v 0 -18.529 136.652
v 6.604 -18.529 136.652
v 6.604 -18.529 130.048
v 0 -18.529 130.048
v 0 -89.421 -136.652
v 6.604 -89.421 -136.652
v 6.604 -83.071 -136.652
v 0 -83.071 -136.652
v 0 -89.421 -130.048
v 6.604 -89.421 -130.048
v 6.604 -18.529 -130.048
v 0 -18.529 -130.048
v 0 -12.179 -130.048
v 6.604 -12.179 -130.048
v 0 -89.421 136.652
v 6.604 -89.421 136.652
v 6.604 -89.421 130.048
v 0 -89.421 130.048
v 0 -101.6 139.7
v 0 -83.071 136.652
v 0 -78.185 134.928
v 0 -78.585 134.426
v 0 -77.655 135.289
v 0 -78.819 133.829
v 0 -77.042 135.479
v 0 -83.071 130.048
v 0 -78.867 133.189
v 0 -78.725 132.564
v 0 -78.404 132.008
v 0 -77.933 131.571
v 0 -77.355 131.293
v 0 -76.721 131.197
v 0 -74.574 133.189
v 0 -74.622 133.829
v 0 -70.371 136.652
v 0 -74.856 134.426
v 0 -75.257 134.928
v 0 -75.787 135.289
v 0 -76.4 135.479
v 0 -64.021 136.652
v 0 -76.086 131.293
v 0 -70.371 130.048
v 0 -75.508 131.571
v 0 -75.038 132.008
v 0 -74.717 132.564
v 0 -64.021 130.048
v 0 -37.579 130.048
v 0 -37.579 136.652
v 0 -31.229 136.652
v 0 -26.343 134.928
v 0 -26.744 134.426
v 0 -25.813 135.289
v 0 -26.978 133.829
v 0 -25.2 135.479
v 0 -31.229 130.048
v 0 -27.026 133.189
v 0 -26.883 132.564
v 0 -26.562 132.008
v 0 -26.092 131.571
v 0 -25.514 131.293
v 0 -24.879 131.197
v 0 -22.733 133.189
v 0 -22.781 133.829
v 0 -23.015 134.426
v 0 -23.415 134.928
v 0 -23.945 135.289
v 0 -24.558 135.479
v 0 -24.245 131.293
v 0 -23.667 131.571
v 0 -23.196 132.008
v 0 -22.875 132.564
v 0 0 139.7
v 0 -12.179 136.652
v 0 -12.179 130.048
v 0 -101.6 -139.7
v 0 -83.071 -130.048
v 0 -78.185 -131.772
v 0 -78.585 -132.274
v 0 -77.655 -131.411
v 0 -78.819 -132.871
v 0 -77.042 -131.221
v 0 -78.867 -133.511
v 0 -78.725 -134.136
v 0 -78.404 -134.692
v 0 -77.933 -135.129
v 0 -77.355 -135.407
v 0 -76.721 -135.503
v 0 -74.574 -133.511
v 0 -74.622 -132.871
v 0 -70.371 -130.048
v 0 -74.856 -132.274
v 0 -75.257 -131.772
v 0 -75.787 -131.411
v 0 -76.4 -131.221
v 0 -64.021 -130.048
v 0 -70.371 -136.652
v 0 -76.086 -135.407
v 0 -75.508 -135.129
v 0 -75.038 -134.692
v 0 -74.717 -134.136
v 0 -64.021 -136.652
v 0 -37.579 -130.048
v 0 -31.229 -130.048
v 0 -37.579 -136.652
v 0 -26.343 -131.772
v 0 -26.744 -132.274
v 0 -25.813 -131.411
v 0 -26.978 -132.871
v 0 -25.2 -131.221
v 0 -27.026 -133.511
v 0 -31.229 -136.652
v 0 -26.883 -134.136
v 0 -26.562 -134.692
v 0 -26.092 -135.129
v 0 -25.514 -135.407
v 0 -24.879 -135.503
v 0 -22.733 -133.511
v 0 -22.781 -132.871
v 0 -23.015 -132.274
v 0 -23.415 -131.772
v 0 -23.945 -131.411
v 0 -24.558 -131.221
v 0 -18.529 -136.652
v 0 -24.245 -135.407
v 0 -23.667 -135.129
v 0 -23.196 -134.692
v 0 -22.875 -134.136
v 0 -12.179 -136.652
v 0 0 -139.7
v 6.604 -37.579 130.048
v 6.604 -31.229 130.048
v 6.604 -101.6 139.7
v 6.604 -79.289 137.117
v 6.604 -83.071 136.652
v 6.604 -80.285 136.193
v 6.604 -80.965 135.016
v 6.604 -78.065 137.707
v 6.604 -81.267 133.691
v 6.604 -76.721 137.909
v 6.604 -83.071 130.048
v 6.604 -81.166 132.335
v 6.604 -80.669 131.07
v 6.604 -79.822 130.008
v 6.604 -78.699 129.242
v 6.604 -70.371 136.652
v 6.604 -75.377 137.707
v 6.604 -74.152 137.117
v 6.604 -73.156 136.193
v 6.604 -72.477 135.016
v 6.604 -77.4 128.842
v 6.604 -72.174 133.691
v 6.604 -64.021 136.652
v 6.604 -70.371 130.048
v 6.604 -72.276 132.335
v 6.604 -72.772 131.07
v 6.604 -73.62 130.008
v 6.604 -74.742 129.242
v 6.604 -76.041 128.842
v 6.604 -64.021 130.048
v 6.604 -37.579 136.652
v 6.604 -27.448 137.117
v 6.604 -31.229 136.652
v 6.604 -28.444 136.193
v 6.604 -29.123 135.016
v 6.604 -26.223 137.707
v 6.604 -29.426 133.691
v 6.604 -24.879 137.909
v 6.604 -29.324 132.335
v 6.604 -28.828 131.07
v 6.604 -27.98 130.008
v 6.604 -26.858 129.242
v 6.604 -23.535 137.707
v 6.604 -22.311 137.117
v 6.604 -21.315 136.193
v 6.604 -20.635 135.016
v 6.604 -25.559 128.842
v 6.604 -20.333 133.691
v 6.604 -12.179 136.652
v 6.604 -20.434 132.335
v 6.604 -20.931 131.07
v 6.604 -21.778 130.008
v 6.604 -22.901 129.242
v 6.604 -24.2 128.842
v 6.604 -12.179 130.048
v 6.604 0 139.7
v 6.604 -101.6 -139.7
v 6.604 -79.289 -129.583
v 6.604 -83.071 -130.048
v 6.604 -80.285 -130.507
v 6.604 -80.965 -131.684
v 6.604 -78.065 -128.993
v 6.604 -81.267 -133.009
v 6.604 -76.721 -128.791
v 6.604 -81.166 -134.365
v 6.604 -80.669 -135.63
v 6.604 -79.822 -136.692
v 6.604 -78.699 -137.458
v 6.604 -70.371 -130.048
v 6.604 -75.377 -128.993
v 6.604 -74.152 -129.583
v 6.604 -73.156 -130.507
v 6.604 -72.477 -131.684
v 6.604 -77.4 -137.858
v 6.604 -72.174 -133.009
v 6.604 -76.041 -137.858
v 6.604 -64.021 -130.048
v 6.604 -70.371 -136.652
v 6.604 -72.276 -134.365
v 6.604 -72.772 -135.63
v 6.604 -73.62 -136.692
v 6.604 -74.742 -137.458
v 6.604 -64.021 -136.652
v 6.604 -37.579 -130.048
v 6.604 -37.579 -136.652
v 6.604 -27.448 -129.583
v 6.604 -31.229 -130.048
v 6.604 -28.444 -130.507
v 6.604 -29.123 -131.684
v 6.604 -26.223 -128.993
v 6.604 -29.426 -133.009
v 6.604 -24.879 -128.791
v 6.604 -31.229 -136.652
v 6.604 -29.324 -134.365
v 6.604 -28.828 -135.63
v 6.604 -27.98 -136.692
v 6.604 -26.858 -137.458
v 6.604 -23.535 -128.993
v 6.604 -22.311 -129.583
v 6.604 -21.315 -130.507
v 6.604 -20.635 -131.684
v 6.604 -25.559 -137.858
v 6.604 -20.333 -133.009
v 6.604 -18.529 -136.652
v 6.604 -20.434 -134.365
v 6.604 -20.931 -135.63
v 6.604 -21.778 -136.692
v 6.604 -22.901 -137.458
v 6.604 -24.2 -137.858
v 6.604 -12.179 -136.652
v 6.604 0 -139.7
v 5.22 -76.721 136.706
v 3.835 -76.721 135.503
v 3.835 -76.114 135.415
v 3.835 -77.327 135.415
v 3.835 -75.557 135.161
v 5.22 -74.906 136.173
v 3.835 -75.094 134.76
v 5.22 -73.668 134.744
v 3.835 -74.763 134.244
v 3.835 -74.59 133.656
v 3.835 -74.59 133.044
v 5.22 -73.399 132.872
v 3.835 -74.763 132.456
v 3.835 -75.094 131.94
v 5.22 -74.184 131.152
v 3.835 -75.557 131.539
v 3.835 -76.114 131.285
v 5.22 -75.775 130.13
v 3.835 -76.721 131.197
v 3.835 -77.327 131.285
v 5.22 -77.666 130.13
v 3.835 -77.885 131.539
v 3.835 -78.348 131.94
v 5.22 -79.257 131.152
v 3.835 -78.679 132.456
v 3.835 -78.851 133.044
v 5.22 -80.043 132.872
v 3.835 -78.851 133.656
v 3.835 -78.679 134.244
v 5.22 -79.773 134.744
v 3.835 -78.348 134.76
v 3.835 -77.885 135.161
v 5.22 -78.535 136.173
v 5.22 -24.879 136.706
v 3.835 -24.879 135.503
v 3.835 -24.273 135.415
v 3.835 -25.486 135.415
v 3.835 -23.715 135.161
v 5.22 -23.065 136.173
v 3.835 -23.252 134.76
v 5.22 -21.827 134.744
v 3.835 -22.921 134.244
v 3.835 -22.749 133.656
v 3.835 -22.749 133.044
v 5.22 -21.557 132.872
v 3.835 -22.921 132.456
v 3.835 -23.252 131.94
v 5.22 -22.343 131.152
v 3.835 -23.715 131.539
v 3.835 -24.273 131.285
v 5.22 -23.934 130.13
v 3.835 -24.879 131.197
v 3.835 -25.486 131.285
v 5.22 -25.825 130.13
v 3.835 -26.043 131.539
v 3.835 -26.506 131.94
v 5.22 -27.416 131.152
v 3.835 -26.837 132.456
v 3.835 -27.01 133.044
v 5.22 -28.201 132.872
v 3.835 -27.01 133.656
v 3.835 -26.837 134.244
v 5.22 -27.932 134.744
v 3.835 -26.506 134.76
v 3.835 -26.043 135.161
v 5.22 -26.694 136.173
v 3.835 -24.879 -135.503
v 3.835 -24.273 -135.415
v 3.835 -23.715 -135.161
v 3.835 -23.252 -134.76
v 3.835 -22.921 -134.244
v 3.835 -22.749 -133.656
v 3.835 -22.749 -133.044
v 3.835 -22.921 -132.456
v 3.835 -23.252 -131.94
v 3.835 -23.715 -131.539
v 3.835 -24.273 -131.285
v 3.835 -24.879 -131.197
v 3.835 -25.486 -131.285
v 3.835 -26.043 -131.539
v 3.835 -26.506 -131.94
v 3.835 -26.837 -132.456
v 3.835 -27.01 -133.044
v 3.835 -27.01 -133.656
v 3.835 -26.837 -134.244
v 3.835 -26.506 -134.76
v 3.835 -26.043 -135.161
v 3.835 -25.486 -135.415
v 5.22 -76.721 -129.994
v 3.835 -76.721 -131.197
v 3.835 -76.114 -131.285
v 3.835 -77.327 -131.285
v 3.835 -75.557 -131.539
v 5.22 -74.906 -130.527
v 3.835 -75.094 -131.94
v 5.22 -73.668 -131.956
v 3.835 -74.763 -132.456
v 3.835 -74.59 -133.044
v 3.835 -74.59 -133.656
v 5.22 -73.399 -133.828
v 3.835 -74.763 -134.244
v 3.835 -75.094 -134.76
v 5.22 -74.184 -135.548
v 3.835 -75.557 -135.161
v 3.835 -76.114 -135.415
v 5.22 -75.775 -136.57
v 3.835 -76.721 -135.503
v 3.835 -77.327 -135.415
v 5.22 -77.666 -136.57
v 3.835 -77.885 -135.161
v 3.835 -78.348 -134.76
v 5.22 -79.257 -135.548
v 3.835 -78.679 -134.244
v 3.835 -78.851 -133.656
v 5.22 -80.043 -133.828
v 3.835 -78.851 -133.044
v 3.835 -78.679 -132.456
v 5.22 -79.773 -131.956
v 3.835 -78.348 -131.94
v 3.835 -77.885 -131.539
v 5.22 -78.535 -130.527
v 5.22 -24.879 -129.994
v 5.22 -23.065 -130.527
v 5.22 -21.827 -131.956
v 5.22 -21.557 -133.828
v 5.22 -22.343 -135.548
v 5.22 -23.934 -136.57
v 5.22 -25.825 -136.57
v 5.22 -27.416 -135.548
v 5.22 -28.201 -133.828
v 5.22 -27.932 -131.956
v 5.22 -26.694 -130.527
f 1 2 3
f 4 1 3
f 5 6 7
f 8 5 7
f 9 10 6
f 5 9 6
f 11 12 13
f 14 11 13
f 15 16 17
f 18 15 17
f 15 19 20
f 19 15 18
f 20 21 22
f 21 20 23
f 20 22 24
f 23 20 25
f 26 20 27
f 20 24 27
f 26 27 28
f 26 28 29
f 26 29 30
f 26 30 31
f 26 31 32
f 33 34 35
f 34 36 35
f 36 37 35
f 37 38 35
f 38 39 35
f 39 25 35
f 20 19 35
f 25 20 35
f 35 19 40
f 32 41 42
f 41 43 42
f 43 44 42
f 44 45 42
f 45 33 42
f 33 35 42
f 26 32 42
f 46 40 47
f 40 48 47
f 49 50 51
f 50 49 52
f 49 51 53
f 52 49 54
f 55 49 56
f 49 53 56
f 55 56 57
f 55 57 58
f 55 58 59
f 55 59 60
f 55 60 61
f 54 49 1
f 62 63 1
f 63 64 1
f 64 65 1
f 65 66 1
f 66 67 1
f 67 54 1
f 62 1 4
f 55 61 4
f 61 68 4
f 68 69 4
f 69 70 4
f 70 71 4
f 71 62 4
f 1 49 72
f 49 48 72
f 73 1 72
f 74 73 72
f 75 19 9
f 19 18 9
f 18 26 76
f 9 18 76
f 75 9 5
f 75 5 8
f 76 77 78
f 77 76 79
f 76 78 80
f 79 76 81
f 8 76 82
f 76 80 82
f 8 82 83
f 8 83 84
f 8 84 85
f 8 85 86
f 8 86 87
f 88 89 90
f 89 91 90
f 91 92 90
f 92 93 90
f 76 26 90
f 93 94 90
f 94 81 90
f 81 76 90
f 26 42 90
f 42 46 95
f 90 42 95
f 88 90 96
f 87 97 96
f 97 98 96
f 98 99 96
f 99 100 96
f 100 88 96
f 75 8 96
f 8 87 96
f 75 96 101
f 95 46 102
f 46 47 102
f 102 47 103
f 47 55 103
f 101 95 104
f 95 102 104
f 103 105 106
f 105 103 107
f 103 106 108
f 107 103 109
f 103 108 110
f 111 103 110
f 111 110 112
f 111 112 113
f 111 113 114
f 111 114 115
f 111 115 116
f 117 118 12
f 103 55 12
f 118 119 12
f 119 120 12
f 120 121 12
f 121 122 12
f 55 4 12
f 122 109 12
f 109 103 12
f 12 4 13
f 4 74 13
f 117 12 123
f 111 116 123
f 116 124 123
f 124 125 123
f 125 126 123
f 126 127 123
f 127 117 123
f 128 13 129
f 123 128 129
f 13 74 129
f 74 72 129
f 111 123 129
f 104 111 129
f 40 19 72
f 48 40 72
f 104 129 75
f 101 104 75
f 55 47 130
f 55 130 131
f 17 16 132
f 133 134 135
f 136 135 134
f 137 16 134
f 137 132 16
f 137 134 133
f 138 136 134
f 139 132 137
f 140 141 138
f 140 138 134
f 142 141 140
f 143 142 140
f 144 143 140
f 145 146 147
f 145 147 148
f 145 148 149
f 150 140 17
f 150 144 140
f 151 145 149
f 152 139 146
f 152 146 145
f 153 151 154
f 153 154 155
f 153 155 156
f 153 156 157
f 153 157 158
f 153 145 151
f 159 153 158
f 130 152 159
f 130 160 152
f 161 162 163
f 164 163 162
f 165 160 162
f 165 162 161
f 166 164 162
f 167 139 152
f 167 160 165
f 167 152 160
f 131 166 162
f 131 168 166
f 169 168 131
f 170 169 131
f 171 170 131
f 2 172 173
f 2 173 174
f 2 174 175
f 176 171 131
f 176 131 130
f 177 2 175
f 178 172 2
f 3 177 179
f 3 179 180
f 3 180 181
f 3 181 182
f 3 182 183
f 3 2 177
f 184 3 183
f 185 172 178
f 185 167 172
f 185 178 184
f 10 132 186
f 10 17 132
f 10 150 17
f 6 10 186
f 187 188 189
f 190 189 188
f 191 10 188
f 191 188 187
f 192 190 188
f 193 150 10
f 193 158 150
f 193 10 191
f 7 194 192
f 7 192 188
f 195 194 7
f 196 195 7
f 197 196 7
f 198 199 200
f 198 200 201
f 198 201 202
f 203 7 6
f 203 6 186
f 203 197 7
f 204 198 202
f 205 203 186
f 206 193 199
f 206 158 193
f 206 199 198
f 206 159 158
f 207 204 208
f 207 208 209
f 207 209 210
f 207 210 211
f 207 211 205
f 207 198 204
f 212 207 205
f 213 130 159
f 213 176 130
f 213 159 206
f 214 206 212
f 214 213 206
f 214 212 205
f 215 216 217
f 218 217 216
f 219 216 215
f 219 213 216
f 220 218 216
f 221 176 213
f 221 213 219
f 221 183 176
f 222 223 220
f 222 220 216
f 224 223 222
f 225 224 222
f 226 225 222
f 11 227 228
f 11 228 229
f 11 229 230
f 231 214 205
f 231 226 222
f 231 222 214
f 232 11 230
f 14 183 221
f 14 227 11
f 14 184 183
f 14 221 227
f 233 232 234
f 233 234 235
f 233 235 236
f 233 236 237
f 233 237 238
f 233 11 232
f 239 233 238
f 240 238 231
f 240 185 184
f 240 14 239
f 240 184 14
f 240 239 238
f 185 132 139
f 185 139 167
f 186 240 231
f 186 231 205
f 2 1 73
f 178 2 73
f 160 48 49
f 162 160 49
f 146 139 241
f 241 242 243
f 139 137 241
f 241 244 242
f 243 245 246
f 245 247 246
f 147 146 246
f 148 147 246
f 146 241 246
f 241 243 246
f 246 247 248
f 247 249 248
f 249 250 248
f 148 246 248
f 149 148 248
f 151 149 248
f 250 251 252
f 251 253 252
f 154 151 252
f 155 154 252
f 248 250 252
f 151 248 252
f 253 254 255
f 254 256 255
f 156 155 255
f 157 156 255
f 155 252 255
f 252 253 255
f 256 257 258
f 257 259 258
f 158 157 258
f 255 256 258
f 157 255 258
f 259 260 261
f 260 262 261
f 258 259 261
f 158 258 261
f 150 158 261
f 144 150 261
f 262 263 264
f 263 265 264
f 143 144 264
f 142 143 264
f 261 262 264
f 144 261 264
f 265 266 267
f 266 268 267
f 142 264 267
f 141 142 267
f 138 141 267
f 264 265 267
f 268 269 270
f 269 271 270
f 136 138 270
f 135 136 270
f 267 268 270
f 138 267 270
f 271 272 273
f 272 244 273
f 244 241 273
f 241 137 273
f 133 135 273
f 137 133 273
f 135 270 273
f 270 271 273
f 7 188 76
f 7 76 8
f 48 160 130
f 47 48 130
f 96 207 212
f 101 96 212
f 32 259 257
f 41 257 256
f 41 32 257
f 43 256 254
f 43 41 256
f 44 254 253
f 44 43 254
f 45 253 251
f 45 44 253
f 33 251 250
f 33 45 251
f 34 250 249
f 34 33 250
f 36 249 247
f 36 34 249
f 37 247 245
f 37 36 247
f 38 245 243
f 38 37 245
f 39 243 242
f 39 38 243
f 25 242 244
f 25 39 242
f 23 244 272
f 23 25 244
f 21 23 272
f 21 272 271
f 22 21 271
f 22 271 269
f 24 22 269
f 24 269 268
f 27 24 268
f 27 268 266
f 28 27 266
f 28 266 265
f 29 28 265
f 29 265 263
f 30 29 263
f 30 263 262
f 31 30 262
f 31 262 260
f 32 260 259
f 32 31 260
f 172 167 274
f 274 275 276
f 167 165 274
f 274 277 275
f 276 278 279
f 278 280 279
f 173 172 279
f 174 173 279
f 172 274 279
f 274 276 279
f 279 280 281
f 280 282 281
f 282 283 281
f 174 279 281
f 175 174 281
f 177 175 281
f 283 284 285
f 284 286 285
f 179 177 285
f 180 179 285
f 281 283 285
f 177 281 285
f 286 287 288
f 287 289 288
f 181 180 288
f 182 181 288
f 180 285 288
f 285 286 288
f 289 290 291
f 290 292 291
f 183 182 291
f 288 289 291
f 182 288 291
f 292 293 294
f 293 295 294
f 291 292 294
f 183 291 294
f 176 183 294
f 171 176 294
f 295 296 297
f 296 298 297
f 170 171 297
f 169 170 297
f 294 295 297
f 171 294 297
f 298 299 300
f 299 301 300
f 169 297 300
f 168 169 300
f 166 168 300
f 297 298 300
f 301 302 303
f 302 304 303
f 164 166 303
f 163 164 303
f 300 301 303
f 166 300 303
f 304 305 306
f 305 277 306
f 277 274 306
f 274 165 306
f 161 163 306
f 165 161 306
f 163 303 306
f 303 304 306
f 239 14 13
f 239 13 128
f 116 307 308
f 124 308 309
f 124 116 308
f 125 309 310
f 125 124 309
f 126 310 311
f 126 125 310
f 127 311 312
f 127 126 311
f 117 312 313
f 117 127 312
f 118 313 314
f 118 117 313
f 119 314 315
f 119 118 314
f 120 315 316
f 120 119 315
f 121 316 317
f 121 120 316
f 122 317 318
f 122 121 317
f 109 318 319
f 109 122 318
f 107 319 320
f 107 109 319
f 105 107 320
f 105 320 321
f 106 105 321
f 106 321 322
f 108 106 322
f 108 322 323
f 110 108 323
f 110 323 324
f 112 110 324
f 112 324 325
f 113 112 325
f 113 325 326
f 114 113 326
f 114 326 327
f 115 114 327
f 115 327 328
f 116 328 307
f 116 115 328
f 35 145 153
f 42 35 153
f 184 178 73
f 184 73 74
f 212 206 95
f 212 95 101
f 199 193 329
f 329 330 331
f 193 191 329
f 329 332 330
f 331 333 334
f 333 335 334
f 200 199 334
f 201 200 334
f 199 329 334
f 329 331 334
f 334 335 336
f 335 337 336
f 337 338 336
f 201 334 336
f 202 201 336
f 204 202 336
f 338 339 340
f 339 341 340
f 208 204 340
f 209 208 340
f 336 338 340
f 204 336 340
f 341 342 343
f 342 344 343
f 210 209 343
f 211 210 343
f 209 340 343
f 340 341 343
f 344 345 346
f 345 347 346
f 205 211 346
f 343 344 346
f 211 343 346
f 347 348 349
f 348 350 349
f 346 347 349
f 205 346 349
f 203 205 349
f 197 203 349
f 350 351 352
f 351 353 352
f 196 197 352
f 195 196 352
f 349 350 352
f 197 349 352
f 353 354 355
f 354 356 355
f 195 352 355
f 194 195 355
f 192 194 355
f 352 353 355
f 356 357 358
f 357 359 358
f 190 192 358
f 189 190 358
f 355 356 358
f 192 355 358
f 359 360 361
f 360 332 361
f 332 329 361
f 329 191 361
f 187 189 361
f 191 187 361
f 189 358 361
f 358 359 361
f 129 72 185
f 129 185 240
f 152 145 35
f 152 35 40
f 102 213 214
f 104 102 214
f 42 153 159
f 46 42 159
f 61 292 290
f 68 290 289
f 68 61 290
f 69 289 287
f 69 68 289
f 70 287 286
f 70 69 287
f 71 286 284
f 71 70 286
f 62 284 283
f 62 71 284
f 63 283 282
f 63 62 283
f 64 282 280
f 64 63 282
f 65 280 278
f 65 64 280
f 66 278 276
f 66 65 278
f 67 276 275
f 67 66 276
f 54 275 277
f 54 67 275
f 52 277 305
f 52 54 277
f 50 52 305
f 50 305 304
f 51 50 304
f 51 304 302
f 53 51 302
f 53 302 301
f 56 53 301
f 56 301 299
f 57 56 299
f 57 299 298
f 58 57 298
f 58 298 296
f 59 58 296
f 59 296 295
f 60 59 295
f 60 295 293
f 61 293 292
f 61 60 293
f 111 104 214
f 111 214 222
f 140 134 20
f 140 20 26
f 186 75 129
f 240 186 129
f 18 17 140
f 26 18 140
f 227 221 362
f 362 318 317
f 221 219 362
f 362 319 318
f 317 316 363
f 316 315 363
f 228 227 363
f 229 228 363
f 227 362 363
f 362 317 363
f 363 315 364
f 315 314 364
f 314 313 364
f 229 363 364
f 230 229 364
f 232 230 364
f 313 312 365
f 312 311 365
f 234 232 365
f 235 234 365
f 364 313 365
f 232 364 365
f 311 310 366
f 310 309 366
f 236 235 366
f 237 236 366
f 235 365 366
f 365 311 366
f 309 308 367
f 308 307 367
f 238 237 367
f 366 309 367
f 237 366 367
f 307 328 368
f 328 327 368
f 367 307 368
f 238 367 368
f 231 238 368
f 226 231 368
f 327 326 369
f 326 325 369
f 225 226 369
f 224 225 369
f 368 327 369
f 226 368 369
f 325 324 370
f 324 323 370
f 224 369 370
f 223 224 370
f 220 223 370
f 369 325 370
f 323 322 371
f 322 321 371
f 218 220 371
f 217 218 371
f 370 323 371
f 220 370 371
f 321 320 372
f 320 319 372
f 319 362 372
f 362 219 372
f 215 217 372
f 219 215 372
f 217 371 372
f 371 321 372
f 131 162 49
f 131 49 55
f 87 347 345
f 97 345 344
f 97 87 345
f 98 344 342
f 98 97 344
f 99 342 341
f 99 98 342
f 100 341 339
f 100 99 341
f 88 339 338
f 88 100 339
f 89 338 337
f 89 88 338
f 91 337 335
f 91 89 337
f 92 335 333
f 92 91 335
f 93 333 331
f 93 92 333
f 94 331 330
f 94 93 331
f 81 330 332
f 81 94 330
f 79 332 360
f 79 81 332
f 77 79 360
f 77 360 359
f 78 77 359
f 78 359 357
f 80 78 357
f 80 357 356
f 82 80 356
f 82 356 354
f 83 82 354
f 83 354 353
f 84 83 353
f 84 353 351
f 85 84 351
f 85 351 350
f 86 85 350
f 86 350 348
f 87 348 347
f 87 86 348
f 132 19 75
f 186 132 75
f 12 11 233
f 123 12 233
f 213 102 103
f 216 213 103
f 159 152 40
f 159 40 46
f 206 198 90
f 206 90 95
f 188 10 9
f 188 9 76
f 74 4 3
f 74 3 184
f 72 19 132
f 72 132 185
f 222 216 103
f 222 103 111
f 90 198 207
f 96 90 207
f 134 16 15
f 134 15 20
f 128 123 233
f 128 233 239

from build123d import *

# Parameters (mm, degrees)
SKETCH1_W                                         = 279.4
SKETCH1_H                                         = 101.6
SKETCH1_R                                         = 2.15265
SKETCH1_W_2                                       = 6.604
SKETCH1_H_2                                       = 6.35
BOSS_EXTRUDE1_DEPTH                               = 6.604
CSK_FOR_8_FLAT_HEAD_SOCKET_CAP_SCREW1_D           = 4.3053
CSK_FOR_8_FLAT_HEAD_SOCKET_CAP_SCREW1_CSINK_D     = 9.1186
CSK_FOR_8_FLAT_HEAD_SOCKET_CAP_SCREW1_CSINK_ANGLE = 82


with BuildPart() as part:
    # Sketch1 → Boss-Extrude1 (new body)
    with BuildSketch(Plane(origin=(0, 0, 0), x_dir=(0, 0, -1), z_dir=(1, 0, 0))):
        with Locations((0, -50.8)):
            Rectangle(SKETCH1_W, SKETCH1_H)
        with Locations((-133.35, -24.8793)):
            Circle(SKETCH1_R, mode=Mode.SUBTRACT)
        with Locations((-133.35, -76.7207)):
            Circle(SKETCH1_R, mode=Mode.SUBTRACT)
        with Locations((133.35, -24.8793)):
            Circle(SKETCH1_R, mode=Mode.SUBTRACT)
        with Locations((133.35, -76.720700102)):
            Circle(SKETCH1_R, mode=Mode.SUBTRACT)
        with Locations((-133.35, -34.4043)):
            Rectangle(SKETCH1_W_2, SKETCH1_H_2, mode=Mode.SUBTRACT)
        with Locations((-133.35, -15.3543)):
            Rectangle(SKETCH1_W_2, SKETCH1_H_2, mode=Mode.SUBTRACT)
        with Locations((-133.35, -86.2457)):
            Rectangle(SKETCH1_W_2, SKETCH1_H_2, mode=Mode.SUBTRACT)
        with Locations((-133.35, -67.1957)):
            Rectangle(SKETCH1_W_2, SKETCH1_H_2, mode=Mode.SUBTRACT)
        with Locations((133.35, -15.3543)):
            Rectangle(SKETCH1_W_2, SKETCH1_H_2, mode=Mode.SUBTRACT)
        with Locations((133.35, -34.4043)):
            Rectangle(SKETCH1_W_2, SKETCH1_H_2, mode=Mode.SUBTRACT)
        with Locations((133.35, -67.195700102)):
            Rectangle(SKETCH1_W_2, SKETCH1_H_2, mode=Mode.SUBTRACT)
        with Locations((133.35, -86.245700102)):
            Rectangle(SKETCH1_W_2, SKETCH1_H_2, mode=Mode.SUBTRACT)
    extrude(amount=BOSS_EXTRUDE1_DEPTH)

    # CSK for #8 Flat Head Socket Cap Screw1 (through all)
    with Locations(Plane(origin=(6.604, 0, 0), x_dir=(0, 0, -1), z_dir=(1, 0, 0))):
        with Locations((-133.35, -24.8793), (-133.35, -76.7207), (133.35, -24.8793), (133.35, -76.720700102)):
            CounterSinkHole(CSK_FOR_8_FLAT_HEAD_SOCKET_CAP_SCREW1_D / 2, CSK_FOR_8_FLAT_HEAD_SOCKET_CAP_SCREW1_CSINK_D / 2, counter_sink_angle=CSK_FOR_8_FLAT_HEAD_SOCKET_CAP_SCREW1_CSINK_ANGLE)


solid = part.part
